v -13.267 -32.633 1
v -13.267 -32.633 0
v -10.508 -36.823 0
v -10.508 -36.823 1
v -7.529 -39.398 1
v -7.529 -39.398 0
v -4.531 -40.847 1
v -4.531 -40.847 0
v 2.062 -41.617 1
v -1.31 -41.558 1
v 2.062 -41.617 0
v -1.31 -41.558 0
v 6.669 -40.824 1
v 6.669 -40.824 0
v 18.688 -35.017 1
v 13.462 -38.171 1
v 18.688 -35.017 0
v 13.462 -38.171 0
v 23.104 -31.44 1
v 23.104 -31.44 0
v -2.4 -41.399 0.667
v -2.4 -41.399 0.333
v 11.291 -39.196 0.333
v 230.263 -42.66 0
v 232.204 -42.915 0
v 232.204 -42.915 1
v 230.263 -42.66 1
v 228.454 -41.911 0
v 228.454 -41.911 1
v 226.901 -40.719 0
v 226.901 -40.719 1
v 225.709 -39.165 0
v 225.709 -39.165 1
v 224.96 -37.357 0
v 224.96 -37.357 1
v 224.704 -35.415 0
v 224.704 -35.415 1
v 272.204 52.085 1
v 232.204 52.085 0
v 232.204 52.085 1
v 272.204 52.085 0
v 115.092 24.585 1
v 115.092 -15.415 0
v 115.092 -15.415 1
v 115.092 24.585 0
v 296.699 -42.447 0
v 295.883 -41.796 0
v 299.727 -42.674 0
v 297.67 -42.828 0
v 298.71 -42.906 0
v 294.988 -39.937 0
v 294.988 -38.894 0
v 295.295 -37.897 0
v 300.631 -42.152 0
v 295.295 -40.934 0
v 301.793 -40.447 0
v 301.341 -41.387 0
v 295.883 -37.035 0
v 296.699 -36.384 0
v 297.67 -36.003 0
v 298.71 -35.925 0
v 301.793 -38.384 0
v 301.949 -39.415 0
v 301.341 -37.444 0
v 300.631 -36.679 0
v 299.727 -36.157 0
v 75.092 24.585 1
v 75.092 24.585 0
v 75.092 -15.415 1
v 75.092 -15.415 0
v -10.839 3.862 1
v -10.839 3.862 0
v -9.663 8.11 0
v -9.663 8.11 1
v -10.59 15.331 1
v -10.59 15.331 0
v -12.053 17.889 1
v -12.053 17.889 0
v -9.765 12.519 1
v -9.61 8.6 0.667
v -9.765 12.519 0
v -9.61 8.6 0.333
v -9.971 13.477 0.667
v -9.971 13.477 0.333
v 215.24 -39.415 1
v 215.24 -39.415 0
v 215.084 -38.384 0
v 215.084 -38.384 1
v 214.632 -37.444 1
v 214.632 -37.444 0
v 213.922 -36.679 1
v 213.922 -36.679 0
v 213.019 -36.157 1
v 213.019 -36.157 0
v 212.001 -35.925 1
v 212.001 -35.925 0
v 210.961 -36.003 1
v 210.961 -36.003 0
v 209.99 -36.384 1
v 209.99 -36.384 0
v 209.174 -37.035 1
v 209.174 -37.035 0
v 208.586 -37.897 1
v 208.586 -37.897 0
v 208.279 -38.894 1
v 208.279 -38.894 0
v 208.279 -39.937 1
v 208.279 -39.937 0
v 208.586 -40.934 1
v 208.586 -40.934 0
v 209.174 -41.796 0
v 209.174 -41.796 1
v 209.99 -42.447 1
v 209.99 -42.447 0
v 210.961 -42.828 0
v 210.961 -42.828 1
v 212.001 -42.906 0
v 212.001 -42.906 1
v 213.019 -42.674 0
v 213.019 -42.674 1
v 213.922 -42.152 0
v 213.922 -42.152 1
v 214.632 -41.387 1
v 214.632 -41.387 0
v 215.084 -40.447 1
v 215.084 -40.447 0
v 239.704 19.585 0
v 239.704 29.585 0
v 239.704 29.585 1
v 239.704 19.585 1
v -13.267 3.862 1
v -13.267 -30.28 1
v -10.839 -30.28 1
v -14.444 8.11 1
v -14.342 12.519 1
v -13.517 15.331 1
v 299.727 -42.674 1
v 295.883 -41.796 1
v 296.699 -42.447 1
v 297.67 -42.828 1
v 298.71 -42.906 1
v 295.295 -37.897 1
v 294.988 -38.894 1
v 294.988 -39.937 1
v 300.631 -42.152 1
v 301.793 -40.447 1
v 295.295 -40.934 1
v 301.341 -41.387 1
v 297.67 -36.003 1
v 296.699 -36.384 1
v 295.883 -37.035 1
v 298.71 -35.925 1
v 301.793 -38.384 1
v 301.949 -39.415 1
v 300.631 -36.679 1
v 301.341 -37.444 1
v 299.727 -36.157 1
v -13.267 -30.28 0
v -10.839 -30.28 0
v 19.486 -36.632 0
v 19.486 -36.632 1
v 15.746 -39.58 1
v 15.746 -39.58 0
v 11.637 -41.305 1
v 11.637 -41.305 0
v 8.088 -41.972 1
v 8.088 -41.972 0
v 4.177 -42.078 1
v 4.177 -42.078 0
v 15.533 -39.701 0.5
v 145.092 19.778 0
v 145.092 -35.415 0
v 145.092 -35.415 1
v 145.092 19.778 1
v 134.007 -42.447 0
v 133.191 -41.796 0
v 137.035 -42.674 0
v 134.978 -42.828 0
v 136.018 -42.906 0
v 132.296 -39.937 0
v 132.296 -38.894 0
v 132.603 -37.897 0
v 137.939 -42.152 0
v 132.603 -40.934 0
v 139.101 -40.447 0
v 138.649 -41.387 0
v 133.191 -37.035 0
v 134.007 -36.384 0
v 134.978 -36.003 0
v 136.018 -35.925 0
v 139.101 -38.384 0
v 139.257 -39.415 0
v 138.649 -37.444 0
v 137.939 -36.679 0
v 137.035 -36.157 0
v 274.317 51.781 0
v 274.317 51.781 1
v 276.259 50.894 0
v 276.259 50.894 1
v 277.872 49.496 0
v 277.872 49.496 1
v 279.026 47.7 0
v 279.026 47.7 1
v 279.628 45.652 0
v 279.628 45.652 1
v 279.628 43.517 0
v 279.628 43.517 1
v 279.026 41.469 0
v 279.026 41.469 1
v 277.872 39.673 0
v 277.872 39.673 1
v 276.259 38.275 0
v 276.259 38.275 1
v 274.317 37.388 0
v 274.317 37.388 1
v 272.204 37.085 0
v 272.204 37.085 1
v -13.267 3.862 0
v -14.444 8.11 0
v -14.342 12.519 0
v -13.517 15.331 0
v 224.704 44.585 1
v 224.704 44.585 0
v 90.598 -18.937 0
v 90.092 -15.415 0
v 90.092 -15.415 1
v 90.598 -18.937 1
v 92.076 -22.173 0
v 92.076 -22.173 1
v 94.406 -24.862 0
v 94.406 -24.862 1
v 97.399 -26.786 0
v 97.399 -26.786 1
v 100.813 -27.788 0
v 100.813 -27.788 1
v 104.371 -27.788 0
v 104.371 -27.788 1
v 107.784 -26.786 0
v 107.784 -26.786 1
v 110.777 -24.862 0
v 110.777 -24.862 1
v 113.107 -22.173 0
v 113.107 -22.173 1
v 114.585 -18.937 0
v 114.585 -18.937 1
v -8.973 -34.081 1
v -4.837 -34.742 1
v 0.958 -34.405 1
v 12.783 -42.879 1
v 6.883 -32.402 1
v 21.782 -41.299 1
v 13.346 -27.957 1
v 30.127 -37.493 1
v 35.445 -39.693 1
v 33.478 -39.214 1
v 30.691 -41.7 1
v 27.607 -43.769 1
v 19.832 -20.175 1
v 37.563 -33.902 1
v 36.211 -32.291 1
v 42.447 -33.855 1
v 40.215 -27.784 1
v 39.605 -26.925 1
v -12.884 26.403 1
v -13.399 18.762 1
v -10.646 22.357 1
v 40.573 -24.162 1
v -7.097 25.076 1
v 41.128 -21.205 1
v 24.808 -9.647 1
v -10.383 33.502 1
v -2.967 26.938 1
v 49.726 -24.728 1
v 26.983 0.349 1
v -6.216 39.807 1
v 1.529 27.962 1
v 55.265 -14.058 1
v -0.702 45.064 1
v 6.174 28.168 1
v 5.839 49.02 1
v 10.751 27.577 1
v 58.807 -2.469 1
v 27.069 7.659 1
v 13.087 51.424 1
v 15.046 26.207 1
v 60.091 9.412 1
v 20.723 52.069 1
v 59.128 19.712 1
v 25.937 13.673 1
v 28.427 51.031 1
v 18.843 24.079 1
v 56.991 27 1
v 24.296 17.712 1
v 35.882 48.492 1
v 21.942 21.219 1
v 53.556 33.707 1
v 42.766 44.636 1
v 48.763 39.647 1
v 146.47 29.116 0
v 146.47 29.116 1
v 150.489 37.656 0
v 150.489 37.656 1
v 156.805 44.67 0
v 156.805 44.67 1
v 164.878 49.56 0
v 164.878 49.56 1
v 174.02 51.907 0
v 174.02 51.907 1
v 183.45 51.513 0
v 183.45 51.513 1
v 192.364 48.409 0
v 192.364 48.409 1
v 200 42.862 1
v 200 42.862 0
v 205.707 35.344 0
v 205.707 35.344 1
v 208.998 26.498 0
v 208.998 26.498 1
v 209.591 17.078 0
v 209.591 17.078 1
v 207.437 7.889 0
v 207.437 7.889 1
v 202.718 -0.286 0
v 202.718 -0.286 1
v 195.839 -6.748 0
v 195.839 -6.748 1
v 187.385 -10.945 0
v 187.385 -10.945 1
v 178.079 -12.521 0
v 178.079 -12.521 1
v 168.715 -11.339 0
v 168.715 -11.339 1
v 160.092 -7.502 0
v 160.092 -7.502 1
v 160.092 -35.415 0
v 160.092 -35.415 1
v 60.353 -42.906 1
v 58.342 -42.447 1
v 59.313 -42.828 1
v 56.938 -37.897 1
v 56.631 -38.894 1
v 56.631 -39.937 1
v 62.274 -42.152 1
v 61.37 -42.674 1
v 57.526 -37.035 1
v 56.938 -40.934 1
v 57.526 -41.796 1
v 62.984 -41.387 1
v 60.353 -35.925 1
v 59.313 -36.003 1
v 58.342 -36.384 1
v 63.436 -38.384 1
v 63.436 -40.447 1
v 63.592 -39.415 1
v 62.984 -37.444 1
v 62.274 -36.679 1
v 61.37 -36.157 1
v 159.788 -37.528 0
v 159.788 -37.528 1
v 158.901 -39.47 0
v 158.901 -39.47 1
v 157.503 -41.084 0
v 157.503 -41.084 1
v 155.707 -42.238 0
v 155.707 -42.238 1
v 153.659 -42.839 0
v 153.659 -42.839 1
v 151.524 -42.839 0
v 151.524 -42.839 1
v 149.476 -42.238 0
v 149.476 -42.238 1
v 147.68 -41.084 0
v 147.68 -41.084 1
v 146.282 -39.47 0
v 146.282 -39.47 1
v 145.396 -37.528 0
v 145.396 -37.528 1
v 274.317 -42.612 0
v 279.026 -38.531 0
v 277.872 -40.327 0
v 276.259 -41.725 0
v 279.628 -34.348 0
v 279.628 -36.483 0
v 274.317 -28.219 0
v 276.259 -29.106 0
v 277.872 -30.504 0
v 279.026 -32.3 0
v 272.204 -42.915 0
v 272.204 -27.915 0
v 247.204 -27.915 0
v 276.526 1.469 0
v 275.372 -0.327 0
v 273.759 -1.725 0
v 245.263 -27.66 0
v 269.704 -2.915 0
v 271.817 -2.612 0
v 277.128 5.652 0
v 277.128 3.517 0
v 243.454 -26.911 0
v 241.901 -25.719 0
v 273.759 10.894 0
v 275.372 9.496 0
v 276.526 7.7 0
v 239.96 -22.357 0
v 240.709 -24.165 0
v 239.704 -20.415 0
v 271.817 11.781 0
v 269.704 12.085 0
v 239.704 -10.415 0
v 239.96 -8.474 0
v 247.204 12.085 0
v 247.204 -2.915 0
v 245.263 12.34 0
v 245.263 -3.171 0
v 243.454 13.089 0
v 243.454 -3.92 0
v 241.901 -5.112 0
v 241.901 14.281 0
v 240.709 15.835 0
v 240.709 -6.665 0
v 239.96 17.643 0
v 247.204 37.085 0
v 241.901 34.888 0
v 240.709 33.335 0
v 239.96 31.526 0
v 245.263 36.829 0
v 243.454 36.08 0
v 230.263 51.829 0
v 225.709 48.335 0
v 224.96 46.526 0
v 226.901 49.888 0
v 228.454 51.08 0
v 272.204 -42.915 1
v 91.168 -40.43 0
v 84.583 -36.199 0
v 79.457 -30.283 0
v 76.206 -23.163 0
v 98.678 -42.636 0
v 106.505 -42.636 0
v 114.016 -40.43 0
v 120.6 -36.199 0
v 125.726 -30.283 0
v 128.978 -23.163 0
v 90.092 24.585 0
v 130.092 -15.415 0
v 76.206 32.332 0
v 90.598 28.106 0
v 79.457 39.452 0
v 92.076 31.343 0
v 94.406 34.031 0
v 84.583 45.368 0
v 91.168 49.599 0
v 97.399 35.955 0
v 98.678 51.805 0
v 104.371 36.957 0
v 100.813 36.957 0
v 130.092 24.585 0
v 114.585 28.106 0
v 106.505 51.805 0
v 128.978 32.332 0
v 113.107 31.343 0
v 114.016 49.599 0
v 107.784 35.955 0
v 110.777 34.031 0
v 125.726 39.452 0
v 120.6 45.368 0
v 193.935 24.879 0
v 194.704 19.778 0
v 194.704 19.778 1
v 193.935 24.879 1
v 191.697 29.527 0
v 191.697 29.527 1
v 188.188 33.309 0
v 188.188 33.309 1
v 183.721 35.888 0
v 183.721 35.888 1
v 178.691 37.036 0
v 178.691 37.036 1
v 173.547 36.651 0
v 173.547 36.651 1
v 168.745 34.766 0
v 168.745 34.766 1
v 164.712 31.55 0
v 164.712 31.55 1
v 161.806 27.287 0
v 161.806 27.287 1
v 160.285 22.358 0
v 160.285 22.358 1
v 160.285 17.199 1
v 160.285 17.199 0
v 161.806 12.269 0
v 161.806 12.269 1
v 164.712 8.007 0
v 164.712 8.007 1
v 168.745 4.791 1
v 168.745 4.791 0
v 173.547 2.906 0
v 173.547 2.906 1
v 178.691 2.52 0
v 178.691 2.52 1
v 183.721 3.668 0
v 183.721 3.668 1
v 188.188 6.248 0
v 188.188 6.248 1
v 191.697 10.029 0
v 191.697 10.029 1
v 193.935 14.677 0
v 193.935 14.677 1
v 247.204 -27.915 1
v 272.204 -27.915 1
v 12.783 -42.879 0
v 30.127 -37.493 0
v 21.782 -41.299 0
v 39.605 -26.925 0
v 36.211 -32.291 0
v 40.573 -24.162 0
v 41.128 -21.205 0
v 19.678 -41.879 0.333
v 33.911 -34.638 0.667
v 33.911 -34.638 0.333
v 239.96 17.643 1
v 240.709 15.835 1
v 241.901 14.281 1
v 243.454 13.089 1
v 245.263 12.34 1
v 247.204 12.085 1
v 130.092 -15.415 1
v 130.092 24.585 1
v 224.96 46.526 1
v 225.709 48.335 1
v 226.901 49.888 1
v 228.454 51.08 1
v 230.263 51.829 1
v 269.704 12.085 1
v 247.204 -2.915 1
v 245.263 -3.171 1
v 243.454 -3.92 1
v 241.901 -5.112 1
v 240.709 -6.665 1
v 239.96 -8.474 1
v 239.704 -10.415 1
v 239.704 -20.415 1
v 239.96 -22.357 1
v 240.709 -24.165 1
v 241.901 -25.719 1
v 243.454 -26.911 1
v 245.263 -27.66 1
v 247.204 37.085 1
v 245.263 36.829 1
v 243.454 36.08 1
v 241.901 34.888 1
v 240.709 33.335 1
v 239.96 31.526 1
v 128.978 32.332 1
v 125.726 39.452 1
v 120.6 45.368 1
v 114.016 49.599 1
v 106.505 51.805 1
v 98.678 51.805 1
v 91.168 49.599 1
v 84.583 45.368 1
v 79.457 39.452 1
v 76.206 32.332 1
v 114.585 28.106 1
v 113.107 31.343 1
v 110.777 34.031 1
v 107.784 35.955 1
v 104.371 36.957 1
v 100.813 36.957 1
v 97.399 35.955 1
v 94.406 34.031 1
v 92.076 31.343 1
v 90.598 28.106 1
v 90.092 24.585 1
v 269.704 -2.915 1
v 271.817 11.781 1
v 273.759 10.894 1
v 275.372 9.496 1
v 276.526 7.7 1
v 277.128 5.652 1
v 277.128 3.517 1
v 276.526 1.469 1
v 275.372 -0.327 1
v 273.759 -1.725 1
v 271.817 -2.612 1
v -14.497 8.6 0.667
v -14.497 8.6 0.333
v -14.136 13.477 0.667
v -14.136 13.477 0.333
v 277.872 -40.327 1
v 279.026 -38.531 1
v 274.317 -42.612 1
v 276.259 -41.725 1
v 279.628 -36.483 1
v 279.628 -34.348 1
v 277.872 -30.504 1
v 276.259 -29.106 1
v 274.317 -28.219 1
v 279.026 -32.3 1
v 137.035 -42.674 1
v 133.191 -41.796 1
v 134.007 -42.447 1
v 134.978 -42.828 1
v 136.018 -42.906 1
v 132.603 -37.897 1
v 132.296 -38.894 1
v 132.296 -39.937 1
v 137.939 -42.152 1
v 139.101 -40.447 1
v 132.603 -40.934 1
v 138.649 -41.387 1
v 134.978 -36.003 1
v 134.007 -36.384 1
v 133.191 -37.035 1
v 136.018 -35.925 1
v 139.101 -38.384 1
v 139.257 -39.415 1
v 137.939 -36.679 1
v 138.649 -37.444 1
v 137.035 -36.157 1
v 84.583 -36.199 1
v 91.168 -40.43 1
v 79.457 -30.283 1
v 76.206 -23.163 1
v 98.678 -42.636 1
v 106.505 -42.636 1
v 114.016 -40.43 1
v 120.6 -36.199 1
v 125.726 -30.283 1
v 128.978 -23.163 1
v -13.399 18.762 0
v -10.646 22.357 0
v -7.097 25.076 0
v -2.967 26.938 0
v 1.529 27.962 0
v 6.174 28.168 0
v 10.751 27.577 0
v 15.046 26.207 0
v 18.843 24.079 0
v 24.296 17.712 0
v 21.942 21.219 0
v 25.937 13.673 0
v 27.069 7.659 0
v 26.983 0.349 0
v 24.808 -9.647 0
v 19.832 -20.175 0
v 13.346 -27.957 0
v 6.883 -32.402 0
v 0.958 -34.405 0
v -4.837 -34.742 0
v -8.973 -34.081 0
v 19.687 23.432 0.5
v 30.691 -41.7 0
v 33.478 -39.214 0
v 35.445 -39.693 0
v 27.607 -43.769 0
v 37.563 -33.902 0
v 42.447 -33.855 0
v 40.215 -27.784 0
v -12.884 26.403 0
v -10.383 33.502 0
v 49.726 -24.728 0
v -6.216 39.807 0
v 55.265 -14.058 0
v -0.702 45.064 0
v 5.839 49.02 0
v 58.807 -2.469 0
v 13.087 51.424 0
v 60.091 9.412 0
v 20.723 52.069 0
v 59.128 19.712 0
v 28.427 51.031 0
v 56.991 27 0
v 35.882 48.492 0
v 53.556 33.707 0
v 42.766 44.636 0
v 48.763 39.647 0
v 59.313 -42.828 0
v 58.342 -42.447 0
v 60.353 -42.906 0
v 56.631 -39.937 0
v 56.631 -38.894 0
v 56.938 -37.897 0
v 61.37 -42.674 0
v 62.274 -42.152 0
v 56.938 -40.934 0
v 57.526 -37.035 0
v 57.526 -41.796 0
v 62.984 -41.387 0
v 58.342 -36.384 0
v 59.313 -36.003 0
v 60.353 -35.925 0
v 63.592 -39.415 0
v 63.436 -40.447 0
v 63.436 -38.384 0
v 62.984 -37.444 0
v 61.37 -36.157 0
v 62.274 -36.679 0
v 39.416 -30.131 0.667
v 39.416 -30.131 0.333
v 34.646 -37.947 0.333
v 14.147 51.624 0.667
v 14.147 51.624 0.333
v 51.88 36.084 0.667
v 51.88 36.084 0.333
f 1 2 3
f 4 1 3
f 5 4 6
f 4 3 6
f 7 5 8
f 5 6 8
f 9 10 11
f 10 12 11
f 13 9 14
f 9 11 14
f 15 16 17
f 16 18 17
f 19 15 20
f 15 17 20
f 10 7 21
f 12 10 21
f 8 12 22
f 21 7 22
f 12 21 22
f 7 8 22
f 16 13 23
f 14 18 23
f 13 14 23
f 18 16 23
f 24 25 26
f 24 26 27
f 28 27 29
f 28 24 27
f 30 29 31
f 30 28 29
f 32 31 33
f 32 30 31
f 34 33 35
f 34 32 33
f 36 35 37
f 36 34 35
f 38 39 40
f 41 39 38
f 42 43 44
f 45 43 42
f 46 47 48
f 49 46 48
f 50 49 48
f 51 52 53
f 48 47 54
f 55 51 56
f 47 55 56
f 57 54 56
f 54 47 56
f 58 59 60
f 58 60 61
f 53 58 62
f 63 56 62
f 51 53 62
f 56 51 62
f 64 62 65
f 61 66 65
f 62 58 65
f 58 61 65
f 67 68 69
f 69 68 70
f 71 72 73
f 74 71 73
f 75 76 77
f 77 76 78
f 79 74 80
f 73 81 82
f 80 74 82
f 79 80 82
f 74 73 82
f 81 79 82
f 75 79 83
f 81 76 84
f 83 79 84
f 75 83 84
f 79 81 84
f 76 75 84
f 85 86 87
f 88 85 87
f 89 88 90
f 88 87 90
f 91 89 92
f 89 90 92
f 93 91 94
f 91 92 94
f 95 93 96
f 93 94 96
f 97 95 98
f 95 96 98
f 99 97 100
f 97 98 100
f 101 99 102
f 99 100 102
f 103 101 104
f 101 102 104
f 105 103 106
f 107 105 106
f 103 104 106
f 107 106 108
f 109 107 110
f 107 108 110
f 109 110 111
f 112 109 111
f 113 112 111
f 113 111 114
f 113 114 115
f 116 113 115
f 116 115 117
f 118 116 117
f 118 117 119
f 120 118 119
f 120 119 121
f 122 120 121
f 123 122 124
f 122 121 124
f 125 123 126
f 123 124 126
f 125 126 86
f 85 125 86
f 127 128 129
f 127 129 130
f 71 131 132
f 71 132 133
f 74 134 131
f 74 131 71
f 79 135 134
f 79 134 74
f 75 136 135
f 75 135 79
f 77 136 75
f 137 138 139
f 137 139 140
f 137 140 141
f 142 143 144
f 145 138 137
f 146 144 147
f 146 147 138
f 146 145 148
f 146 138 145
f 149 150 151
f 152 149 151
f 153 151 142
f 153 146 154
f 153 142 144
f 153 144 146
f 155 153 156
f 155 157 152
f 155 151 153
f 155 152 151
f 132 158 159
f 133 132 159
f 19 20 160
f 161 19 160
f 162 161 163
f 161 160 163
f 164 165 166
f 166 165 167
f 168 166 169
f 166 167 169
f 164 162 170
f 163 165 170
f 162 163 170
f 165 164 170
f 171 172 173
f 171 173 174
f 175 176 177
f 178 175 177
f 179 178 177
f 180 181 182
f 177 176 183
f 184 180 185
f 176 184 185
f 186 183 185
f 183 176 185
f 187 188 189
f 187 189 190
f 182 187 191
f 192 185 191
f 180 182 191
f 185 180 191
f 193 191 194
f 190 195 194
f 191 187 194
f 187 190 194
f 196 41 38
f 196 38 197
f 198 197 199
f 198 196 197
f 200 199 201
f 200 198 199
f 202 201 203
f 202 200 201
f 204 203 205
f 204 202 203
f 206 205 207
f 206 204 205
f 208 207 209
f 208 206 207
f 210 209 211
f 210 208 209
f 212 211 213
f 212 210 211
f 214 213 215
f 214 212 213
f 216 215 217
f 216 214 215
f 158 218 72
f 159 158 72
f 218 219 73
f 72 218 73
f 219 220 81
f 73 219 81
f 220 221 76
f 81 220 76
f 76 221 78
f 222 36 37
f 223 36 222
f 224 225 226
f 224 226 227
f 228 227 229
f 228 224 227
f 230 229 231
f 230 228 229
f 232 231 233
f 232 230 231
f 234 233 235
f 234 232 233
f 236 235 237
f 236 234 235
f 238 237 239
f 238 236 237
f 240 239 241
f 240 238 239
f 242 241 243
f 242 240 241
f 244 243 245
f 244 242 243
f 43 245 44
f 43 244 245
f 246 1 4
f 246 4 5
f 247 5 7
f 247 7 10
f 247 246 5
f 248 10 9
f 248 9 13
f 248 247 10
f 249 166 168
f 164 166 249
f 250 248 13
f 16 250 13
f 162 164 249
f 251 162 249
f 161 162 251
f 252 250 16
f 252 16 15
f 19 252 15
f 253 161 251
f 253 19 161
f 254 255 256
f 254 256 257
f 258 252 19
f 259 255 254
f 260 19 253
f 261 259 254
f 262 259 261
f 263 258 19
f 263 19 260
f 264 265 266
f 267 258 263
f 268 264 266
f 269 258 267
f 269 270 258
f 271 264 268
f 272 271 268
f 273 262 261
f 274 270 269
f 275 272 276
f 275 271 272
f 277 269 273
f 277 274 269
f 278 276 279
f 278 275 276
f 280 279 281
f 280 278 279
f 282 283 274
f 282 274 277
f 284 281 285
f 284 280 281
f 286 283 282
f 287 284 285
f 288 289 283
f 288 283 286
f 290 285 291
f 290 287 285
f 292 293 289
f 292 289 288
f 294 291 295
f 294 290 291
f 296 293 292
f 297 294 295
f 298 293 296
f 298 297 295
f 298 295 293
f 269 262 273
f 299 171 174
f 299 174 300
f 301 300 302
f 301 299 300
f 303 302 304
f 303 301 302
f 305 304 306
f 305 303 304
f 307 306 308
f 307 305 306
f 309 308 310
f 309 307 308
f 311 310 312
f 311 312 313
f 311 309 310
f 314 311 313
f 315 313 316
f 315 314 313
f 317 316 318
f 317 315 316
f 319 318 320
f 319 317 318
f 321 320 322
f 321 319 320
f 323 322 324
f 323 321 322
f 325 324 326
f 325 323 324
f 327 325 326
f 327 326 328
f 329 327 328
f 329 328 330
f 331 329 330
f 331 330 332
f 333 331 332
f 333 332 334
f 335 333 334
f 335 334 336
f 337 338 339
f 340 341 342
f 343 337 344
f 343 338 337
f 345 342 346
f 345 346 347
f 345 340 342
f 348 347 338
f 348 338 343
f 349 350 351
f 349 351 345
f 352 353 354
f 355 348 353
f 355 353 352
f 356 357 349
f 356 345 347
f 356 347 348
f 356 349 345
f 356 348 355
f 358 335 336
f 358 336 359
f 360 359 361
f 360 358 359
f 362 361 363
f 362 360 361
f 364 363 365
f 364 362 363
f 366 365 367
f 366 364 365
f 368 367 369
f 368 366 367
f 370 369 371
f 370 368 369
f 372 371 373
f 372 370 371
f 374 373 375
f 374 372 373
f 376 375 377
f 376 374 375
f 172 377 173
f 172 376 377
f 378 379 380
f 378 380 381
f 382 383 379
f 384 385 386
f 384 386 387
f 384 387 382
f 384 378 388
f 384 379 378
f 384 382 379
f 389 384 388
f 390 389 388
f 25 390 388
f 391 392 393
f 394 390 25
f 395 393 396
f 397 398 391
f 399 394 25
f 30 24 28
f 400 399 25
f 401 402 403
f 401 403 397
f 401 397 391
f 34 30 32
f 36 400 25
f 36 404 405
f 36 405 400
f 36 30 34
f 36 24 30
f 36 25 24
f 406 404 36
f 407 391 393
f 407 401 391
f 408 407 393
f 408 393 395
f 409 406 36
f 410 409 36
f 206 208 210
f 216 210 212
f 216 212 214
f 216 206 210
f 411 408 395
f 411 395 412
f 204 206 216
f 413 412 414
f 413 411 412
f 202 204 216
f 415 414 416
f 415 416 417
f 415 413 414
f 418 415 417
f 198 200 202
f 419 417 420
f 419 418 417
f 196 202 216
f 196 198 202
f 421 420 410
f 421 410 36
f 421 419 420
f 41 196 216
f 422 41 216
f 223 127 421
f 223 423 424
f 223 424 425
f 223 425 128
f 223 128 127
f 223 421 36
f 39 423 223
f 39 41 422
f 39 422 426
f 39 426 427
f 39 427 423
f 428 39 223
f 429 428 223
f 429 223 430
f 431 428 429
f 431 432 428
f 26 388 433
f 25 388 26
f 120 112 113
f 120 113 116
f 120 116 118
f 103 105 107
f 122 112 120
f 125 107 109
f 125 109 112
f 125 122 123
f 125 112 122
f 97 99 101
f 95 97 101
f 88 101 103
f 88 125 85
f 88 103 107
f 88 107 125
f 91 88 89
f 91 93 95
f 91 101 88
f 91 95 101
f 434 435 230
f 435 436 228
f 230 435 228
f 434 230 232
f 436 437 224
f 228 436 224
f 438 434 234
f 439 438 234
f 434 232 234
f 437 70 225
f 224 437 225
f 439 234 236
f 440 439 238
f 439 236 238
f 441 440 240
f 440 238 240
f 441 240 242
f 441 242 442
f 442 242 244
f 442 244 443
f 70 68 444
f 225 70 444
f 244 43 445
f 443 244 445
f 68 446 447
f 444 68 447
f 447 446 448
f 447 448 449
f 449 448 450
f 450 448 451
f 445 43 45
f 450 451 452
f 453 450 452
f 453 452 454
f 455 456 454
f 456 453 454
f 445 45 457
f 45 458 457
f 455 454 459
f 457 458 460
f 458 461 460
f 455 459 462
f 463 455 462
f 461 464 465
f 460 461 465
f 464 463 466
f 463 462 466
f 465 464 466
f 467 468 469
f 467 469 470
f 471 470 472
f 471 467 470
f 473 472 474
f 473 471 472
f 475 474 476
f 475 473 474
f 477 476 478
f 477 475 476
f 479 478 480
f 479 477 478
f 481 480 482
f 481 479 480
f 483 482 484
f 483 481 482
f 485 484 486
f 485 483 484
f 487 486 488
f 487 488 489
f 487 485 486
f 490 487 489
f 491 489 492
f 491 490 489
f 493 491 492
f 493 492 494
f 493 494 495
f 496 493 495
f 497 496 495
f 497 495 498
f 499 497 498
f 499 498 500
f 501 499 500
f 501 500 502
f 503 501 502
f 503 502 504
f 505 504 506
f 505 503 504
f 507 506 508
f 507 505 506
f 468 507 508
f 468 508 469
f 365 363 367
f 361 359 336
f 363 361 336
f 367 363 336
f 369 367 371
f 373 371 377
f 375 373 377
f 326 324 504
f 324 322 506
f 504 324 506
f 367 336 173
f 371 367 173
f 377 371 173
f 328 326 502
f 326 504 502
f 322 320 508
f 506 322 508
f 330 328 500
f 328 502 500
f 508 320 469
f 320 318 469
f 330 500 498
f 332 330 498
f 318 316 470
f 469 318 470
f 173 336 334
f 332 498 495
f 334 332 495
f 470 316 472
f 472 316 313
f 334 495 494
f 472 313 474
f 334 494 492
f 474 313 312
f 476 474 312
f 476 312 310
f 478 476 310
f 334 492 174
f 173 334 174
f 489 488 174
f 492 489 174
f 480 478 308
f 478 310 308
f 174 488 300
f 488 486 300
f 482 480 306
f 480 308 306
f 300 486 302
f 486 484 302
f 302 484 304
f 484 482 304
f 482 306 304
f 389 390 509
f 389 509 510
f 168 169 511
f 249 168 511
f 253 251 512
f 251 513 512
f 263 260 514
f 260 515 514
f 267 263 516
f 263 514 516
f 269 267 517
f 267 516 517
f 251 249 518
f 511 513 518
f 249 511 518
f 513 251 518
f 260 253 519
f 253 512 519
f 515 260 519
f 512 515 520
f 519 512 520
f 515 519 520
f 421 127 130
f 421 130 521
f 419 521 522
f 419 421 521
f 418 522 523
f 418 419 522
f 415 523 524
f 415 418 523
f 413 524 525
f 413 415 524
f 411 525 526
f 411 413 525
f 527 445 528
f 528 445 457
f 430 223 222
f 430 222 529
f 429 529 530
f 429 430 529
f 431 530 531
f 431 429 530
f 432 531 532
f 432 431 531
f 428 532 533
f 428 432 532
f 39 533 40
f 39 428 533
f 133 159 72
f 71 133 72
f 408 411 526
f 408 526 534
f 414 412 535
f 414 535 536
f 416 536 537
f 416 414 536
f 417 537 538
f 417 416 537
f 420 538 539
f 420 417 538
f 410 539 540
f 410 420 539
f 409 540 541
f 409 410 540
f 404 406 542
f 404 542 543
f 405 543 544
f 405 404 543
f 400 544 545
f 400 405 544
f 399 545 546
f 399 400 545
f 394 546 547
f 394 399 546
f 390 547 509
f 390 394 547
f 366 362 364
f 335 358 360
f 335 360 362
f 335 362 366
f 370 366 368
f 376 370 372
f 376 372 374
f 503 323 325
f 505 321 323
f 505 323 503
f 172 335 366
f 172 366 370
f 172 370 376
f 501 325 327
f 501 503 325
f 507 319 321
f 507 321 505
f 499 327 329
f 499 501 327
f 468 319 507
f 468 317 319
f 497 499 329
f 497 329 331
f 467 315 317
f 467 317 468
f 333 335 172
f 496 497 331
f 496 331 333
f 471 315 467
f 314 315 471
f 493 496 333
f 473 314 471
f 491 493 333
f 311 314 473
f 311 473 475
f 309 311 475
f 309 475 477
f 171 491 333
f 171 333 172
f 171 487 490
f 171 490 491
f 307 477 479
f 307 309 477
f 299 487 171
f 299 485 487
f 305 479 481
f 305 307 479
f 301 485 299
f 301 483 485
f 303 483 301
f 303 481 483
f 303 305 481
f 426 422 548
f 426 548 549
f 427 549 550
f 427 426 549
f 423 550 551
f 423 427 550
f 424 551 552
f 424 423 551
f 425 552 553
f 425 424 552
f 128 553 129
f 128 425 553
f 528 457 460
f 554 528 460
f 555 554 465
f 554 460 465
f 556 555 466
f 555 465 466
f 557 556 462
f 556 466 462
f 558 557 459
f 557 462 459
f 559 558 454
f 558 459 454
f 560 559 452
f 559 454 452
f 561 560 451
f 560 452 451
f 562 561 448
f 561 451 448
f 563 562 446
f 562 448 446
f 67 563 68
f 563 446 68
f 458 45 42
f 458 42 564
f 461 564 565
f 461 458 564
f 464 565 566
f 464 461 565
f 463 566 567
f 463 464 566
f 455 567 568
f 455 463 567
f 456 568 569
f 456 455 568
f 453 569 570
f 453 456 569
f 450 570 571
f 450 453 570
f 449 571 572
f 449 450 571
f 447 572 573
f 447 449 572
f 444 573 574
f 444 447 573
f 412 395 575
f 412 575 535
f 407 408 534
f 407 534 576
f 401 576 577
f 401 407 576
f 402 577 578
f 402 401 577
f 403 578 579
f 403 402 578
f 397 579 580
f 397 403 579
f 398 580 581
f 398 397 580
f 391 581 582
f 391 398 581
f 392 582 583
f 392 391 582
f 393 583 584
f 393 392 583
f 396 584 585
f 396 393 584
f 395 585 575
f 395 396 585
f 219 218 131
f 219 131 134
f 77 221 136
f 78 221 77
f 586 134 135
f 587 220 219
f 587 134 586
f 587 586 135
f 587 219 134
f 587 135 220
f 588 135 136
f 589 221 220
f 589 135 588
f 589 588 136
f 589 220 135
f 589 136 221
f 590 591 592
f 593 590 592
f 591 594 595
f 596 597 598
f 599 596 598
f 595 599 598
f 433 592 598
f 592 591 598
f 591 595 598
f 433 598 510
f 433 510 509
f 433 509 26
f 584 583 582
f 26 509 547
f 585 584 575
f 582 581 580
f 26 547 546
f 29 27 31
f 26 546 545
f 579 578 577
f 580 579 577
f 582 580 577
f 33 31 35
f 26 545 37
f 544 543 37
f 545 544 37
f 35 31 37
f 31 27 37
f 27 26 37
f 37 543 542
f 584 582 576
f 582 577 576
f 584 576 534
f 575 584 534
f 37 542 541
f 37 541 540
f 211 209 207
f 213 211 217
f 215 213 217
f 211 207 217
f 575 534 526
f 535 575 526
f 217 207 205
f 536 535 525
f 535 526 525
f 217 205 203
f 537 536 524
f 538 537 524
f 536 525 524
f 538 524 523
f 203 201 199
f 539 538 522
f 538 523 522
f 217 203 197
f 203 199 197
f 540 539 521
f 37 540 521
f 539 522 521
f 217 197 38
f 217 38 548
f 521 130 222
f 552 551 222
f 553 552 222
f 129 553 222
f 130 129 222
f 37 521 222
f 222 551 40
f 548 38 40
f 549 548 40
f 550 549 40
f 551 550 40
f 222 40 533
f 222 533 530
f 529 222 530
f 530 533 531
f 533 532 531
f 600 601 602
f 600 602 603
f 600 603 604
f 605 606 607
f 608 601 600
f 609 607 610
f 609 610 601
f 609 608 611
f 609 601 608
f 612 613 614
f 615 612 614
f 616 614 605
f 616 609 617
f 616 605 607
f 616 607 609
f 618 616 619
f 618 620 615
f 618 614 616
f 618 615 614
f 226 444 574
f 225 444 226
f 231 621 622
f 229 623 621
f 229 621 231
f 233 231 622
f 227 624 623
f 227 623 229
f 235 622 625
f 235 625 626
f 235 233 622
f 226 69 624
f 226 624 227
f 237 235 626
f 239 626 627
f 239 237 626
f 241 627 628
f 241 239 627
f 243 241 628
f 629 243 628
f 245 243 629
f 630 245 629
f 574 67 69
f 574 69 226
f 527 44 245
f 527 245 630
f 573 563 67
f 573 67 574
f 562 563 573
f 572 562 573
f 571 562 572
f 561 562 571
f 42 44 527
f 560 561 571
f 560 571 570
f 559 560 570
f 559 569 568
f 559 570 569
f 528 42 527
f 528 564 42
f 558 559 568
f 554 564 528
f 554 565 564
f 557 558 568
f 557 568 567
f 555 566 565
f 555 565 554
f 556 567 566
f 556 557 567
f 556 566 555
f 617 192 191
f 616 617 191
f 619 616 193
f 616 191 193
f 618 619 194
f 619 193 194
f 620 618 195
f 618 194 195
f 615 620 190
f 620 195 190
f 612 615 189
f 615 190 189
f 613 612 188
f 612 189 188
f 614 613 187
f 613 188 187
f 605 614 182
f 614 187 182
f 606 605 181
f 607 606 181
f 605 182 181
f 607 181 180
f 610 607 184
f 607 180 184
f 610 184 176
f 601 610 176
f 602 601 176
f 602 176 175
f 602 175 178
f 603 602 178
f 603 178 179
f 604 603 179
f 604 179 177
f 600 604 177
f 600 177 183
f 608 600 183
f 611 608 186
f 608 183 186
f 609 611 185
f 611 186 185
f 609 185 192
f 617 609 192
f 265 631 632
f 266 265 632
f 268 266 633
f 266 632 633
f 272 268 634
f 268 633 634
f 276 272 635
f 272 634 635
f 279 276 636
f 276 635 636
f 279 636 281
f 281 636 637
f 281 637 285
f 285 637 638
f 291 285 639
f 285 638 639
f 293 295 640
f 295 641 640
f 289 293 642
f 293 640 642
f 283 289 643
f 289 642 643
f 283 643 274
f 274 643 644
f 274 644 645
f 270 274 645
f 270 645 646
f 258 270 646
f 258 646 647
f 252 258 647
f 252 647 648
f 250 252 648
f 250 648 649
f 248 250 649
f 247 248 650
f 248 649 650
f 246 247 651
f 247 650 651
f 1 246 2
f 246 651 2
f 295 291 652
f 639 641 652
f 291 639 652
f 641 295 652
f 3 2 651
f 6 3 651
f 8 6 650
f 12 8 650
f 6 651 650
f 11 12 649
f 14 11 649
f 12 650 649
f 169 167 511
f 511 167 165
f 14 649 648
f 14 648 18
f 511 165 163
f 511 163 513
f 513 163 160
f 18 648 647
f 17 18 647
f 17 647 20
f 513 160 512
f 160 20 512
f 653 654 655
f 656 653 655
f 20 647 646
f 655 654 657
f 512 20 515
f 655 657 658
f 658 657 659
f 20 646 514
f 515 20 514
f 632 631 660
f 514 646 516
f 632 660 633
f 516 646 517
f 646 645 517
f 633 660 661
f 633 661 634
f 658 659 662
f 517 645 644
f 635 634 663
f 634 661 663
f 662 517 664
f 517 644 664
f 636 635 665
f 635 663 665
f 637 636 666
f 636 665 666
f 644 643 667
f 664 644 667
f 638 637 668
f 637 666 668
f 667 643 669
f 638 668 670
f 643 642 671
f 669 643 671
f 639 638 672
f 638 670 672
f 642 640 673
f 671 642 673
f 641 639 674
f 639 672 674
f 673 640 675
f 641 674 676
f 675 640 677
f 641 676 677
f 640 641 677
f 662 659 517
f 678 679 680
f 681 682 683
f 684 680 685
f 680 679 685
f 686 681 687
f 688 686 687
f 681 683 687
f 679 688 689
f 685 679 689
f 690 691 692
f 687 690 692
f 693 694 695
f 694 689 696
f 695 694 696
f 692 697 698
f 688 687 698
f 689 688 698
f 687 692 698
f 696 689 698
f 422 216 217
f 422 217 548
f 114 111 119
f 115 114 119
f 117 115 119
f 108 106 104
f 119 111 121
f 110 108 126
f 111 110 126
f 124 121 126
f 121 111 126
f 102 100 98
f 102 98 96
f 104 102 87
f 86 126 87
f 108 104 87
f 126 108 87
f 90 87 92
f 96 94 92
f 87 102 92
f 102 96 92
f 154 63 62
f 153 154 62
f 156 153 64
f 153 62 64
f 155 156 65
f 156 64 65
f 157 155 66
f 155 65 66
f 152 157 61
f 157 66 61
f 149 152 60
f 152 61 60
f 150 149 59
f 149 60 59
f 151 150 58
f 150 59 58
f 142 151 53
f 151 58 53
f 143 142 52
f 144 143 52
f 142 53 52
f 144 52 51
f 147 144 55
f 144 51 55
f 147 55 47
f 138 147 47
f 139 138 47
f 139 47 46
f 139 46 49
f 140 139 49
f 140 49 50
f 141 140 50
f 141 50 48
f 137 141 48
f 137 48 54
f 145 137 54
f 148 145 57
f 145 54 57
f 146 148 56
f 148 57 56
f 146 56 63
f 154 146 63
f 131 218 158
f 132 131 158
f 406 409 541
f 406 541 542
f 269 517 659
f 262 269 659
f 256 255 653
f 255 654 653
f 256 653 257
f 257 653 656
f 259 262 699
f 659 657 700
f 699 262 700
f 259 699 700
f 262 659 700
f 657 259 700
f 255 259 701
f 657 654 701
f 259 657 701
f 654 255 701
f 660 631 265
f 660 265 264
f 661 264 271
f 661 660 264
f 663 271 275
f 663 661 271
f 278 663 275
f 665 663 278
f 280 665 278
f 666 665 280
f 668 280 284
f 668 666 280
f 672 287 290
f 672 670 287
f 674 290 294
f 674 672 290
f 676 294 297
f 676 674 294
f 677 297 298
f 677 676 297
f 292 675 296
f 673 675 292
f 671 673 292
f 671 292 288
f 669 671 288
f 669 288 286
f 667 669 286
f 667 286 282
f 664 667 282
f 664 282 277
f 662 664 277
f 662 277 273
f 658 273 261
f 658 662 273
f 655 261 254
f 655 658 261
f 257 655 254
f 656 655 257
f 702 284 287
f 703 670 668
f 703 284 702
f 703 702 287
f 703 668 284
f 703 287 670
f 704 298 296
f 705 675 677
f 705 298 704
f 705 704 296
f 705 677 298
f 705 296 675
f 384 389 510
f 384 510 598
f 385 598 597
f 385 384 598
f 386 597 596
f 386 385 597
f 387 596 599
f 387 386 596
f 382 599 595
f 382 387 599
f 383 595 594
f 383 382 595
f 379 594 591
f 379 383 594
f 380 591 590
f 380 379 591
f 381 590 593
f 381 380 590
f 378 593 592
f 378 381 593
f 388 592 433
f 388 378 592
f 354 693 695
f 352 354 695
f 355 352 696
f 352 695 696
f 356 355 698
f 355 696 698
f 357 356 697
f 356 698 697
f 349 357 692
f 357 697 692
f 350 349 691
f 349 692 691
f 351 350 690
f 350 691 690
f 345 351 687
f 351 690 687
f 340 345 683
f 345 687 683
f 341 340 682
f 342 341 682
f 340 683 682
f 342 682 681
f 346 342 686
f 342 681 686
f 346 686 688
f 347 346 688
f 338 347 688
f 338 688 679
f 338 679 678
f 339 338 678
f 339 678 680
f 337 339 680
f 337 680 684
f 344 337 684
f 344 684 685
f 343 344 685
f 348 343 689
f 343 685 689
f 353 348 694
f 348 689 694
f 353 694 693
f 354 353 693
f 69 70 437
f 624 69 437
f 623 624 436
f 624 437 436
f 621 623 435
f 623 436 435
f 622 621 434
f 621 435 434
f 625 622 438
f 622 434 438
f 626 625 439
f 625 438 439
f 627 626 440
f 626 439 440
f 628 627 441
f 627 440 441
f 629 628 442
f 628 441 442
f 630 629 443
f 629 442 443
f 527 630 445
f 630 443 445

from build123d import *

# Parameters (mm, degrees)
BOSS_EXTRUDE2_DEPTH   = 1
BOSS_EXTRUDE2_2_DEPTH = 1
SKETCH1_R             = 17.306246178
BOSS_EXTRUDE2_3_DEPTH = 1
BOSS_EXTRUDE2_4_DEPTH = 1
SKETCH1_R_2           = 3.5
BOSS_EXTRUDE2_5_DEPTH = 1
BOSS_EXTRUDE2_6_DEPTH = 1
BOSS_EXTRUDE2_7_DEPTH = 1
BOSS_EXTRUDE2_8_DEPTH = 1
BOSS_EXTRUDE2_9_DEPTH = 1


with BuildPart() as part:
    # Sketch1 → Boss-Extrude2 (new body)
    with BuildSketch(Plane.XY):
        with BuildLine():
            add(Edge.make_bspline(
                [(4.176977783, -42.078185234), (18.395083622, -45.682524488), (39.336025743, -37.451807212), (41.128331273, -21.205264171)],
                knots=[0, 0, 0, 0, 1, 1, 1, 1], degree=3))
            add(Edge.make_bspline(
                [(41.128331273, -21.205264171), (41.208901802, -30.388911485), (35.516667738, -39.241031169), (27.607041209, -43.768658793)],
                knots=[0, 0, 0, 0, 1, 1, 1, 1], degree=3))
            add(Edge.make_bspline(
                [(-13.399125446, 18.761712123), (-14.595958135, 34.786255378), (10.553904842, 61.655876776), (77.770432351, 31.919386813), (54.935467618, -33.501084615), (27.607041209, -43.768658793)],
                knots=[0, 0, 0, 0, 0.258384755, 0.488789274, 1, 1, 1, 1], degree=3))
            add(Edge.make_bspline(
                [(-13.399125446, 18.761712123), (-7.123250575, 29.873286707), (48.621576352, 32.824960108), (18.52393849, -46.184621535), (-13.267373889, -32.633459969)],
                knots=[0, 0, 0, 0, 0.318657049, 1, 1, 1, 1], degree=3))
            add(Edge.make_bspline(
                [(-13.267373889, -32.633459969), (-5.380803499, -48.687362539), (13.798541794, -40.167801005), (23.104333777, -31.440277806)],
                knots=[0, 0, 0, 0, 1, 1, 1, 1], degree=3))
            add(Edge.make_bspline(
                [(23.104333777, -31.440277806), (17.42523783, -42.64360628), (4.176977783, -42.078185234)],
                knots=[0, 0, 0, 1, 1, 1], degree=2))
        make_face()
    extrude(amount=BOSS_EXTRUDE2_DEPTH)


with BuildPart() as body_2:
    # Sketch1 → Boss-Extrude2 2 (new body)
    with BuildSketch(Plane.XY):
        with BuildLine():
            Line((75.09173282, 24.58453691), (75.09173282, -15.41546309))
            ThreePointArc((75.09173282, -15.41546309), (102.59173282, -42.91546309), (130.09173282, -15.41546309))
            Line((130.09173282, -15.41546309), (130.09173282, 24.58453691))
            ThreePointArc((130.09173282, 24.58453691), (102.59173282, 52.08453691), (75.09173282, 24.58453691))
        make_face()
        with BuildLine():
            ThreePointArc((90.09173282, -15.41546309), (102.59173282, -27.91546309), (115.09173282, -15.41546309))
            Line((115.09173282, -15.41546309), (115.09173282, 24.58453691))
            ThreePointArc((115.09173282, 24.58453691), (102.59173282, 37.08453691), (90.09173282, 24.58453691))
            Line((90.09173282, 24.58453691), (90.09173282, -15.41546309))
        make_face(mode=Mode.SUBTRACT)
    extrude(amount=BOSS_EXTRUDE2_2_DEPTH)


with BuildPart() as body_3:
    # Sketch1 → Boss-Extrude2 3 (new body)
    with BuildSketch(Plane.XY):
        with BuildLine():
            ThreePointArc((160.09173282, -35.41546309), (152.59173282, -42.91546309), (145.09173282, -35.41546309))
            Line((145.09173282, -35.41546309), (145.09173282, 19.778290732))
            ThreePointArc((145.09173282, 19.778290732), (205.706929805, 35.344177997), (160.09173282, -7.501507385))
            Line((160.09173282, -7.501507385), (160.09173282, -35.41546309))
        make_face()
        with Locations((177.397978998, 19.778290732)):
            Circle(SKETCH1_R, mode=Mode.SUBTRACT)
    extrude(amount=BOSS_EXTRUDE2_3_DEPTH)


with BuildPart() as body_4:
    # Sketch1 → Boss-Extrude2 4 (new body)
    with BuildSketch(Plane.XY):
        with BuildLine():
            ThreePointArc((239.704225176, 19.58453691), (241.900924317, 14.281236051), (247.204225176, 12.08453691))
            Line((247.204225176, 12.08453691), (269.704225176, 12.08453691))
            ThreePointArc((269.704225176, 12.08453691), (277.204225176, 4.58453691), (269.704225176, -2.91546309))
            Line((269.704225176, -2.91546309), (247.204225176, -2.91546309))
            ThreePointArc((247.204225176, -2.91546309), (241.900924317, -5.112162231), (239.704225176, -10.41546309))
            Line((239.704225176, -10.41546309), (239.704225176, -20.41546309))
            ThreePointArc((239.704225176, -20.41546309), (241.900924317, -25.718763949), (247.204225176, -27.91546309))
            Line((247.204225176, -27.91546309), (272.204225176, -27.91546309))
            ThreePointArc((272.204225176, -27.91546309), (279.704225176, -35.41546309), (272.204225176, -42.91546309))
            Line((272.204225176, -42.91546309), (232.204225176, -42.91546309))
            ThreePointArc((232.204225176, -42.91546309), (226.900924317, -40.718763949), (224.704225176, -35.41546309))
            Line((224.704225176, -35.41546309), (224.704225176, 44.58453691))
            ThreePointArc((224.704225176, 44.58453691), (226.900924317, 49.887837769), (232.204225176, 52.08453691))
            Line((232.204225176, 52.08453691), (272.204225176, 52.08453691))
            ThreePointArc((272.204225176, 52.08453691), (279.704225176, 44.58453691), (272.204225176, 37.08453691))
            Line((272.204225176, 37.08453691), (247.204225176, 37.08453691))
            ThreePointArc((247.204225176, 37.08453691), (241.900924317, 34.887837769), (239.704225176, 29.58453691))
            Line((239.704225176, 29.58453691), (239.704225176, 19.58453691))
        make_face()
    extrude(amount=BOSS_EXTRUDE2_4_DEPTH)


with BuildPart() as body_5:
    # Sketch1 → Boss-Extrude2 5 (new body)
    with BuildSketch(Plane.XY):
        with Locations((60.09173282, -39.41546309)):
            Circle(SKETCH1_R_2)
    extrude(amount=BOSS_EXTRUDE2_5_DEPTH)


with BuildPart() as body_6:
    # Sketch1 → Boss-Extrude2 6 (new body)
    with BuildSketch(Plane.XY):
        with Locations((211.739881598, -39.41546309)):
            Circle(SKETCH1_R_2)
    extrude(amount=BOSS_EXTRUDE2_6_DEPTH)


with BuildPart() as body_7:
    # Sketch1 → Boss-Extrude2 7 (new body)
    with BuildSketch(Plane.XY):
        with Locations((298.448680124, -39.41546309)):
            Circle(SKETCH1_R_2)
    extrude(amount=BOSS_EXTRUDE2_7_DEPTH)


with BuildPart() as body_8:
    # Sketch1 → Boss-Extrude2 8 (new body)
    with BuildSketch(Plane.XY):
        with Locations((135.756758441, -39.41546309)):
            Circle(SKETCH1_R_2)
    extrude(amount=BOSS_EXTRUDE2_8_DEPTH)


with BuildPart() as body_9:
    # Sketch1 → Boss-Extrude2 9 (new body)
    with BuildSketch(Plane.XY):
        with BuildLine():
            Line((-10.839438068, -30.279571053), (-10.839438068, 3.862337))
            add(Edge.make_bspline(
                [(-10.839438068, 3.862337), (-8.857628869, 8.32956724), (-9.066883985, 13.910194283), (-12.053405979, 17.888605243)],
                knots=[0, 0, 0, 0, 1, 1, 1, 1], degree=3))
            add(Edge.make_bspline(
                [(-13.267373889, 3.862337), (-15.249183089, 8.32956724), (-15.039927972, 13.910194283), (-12.053405979, 17.888605243)],
                knots=[0, 0, 0, 0, 1, 1, 1, 1], degree=3))
            Line((-13.267373889, 3.862337), (-13.267373889, -30.279571053))
            Line((-13.267373889, -30.279571053), (-10.839438068, -30.279571053))
        make_face()
    extrude(amount=BOSS_EXTRUDE2_9_DEPTH)


solid = Compound([part.part, body_2.part, body_3.part, body_4.part, body_5.part, body_6.part, body_7.part, body_8.part, body_9.part])
